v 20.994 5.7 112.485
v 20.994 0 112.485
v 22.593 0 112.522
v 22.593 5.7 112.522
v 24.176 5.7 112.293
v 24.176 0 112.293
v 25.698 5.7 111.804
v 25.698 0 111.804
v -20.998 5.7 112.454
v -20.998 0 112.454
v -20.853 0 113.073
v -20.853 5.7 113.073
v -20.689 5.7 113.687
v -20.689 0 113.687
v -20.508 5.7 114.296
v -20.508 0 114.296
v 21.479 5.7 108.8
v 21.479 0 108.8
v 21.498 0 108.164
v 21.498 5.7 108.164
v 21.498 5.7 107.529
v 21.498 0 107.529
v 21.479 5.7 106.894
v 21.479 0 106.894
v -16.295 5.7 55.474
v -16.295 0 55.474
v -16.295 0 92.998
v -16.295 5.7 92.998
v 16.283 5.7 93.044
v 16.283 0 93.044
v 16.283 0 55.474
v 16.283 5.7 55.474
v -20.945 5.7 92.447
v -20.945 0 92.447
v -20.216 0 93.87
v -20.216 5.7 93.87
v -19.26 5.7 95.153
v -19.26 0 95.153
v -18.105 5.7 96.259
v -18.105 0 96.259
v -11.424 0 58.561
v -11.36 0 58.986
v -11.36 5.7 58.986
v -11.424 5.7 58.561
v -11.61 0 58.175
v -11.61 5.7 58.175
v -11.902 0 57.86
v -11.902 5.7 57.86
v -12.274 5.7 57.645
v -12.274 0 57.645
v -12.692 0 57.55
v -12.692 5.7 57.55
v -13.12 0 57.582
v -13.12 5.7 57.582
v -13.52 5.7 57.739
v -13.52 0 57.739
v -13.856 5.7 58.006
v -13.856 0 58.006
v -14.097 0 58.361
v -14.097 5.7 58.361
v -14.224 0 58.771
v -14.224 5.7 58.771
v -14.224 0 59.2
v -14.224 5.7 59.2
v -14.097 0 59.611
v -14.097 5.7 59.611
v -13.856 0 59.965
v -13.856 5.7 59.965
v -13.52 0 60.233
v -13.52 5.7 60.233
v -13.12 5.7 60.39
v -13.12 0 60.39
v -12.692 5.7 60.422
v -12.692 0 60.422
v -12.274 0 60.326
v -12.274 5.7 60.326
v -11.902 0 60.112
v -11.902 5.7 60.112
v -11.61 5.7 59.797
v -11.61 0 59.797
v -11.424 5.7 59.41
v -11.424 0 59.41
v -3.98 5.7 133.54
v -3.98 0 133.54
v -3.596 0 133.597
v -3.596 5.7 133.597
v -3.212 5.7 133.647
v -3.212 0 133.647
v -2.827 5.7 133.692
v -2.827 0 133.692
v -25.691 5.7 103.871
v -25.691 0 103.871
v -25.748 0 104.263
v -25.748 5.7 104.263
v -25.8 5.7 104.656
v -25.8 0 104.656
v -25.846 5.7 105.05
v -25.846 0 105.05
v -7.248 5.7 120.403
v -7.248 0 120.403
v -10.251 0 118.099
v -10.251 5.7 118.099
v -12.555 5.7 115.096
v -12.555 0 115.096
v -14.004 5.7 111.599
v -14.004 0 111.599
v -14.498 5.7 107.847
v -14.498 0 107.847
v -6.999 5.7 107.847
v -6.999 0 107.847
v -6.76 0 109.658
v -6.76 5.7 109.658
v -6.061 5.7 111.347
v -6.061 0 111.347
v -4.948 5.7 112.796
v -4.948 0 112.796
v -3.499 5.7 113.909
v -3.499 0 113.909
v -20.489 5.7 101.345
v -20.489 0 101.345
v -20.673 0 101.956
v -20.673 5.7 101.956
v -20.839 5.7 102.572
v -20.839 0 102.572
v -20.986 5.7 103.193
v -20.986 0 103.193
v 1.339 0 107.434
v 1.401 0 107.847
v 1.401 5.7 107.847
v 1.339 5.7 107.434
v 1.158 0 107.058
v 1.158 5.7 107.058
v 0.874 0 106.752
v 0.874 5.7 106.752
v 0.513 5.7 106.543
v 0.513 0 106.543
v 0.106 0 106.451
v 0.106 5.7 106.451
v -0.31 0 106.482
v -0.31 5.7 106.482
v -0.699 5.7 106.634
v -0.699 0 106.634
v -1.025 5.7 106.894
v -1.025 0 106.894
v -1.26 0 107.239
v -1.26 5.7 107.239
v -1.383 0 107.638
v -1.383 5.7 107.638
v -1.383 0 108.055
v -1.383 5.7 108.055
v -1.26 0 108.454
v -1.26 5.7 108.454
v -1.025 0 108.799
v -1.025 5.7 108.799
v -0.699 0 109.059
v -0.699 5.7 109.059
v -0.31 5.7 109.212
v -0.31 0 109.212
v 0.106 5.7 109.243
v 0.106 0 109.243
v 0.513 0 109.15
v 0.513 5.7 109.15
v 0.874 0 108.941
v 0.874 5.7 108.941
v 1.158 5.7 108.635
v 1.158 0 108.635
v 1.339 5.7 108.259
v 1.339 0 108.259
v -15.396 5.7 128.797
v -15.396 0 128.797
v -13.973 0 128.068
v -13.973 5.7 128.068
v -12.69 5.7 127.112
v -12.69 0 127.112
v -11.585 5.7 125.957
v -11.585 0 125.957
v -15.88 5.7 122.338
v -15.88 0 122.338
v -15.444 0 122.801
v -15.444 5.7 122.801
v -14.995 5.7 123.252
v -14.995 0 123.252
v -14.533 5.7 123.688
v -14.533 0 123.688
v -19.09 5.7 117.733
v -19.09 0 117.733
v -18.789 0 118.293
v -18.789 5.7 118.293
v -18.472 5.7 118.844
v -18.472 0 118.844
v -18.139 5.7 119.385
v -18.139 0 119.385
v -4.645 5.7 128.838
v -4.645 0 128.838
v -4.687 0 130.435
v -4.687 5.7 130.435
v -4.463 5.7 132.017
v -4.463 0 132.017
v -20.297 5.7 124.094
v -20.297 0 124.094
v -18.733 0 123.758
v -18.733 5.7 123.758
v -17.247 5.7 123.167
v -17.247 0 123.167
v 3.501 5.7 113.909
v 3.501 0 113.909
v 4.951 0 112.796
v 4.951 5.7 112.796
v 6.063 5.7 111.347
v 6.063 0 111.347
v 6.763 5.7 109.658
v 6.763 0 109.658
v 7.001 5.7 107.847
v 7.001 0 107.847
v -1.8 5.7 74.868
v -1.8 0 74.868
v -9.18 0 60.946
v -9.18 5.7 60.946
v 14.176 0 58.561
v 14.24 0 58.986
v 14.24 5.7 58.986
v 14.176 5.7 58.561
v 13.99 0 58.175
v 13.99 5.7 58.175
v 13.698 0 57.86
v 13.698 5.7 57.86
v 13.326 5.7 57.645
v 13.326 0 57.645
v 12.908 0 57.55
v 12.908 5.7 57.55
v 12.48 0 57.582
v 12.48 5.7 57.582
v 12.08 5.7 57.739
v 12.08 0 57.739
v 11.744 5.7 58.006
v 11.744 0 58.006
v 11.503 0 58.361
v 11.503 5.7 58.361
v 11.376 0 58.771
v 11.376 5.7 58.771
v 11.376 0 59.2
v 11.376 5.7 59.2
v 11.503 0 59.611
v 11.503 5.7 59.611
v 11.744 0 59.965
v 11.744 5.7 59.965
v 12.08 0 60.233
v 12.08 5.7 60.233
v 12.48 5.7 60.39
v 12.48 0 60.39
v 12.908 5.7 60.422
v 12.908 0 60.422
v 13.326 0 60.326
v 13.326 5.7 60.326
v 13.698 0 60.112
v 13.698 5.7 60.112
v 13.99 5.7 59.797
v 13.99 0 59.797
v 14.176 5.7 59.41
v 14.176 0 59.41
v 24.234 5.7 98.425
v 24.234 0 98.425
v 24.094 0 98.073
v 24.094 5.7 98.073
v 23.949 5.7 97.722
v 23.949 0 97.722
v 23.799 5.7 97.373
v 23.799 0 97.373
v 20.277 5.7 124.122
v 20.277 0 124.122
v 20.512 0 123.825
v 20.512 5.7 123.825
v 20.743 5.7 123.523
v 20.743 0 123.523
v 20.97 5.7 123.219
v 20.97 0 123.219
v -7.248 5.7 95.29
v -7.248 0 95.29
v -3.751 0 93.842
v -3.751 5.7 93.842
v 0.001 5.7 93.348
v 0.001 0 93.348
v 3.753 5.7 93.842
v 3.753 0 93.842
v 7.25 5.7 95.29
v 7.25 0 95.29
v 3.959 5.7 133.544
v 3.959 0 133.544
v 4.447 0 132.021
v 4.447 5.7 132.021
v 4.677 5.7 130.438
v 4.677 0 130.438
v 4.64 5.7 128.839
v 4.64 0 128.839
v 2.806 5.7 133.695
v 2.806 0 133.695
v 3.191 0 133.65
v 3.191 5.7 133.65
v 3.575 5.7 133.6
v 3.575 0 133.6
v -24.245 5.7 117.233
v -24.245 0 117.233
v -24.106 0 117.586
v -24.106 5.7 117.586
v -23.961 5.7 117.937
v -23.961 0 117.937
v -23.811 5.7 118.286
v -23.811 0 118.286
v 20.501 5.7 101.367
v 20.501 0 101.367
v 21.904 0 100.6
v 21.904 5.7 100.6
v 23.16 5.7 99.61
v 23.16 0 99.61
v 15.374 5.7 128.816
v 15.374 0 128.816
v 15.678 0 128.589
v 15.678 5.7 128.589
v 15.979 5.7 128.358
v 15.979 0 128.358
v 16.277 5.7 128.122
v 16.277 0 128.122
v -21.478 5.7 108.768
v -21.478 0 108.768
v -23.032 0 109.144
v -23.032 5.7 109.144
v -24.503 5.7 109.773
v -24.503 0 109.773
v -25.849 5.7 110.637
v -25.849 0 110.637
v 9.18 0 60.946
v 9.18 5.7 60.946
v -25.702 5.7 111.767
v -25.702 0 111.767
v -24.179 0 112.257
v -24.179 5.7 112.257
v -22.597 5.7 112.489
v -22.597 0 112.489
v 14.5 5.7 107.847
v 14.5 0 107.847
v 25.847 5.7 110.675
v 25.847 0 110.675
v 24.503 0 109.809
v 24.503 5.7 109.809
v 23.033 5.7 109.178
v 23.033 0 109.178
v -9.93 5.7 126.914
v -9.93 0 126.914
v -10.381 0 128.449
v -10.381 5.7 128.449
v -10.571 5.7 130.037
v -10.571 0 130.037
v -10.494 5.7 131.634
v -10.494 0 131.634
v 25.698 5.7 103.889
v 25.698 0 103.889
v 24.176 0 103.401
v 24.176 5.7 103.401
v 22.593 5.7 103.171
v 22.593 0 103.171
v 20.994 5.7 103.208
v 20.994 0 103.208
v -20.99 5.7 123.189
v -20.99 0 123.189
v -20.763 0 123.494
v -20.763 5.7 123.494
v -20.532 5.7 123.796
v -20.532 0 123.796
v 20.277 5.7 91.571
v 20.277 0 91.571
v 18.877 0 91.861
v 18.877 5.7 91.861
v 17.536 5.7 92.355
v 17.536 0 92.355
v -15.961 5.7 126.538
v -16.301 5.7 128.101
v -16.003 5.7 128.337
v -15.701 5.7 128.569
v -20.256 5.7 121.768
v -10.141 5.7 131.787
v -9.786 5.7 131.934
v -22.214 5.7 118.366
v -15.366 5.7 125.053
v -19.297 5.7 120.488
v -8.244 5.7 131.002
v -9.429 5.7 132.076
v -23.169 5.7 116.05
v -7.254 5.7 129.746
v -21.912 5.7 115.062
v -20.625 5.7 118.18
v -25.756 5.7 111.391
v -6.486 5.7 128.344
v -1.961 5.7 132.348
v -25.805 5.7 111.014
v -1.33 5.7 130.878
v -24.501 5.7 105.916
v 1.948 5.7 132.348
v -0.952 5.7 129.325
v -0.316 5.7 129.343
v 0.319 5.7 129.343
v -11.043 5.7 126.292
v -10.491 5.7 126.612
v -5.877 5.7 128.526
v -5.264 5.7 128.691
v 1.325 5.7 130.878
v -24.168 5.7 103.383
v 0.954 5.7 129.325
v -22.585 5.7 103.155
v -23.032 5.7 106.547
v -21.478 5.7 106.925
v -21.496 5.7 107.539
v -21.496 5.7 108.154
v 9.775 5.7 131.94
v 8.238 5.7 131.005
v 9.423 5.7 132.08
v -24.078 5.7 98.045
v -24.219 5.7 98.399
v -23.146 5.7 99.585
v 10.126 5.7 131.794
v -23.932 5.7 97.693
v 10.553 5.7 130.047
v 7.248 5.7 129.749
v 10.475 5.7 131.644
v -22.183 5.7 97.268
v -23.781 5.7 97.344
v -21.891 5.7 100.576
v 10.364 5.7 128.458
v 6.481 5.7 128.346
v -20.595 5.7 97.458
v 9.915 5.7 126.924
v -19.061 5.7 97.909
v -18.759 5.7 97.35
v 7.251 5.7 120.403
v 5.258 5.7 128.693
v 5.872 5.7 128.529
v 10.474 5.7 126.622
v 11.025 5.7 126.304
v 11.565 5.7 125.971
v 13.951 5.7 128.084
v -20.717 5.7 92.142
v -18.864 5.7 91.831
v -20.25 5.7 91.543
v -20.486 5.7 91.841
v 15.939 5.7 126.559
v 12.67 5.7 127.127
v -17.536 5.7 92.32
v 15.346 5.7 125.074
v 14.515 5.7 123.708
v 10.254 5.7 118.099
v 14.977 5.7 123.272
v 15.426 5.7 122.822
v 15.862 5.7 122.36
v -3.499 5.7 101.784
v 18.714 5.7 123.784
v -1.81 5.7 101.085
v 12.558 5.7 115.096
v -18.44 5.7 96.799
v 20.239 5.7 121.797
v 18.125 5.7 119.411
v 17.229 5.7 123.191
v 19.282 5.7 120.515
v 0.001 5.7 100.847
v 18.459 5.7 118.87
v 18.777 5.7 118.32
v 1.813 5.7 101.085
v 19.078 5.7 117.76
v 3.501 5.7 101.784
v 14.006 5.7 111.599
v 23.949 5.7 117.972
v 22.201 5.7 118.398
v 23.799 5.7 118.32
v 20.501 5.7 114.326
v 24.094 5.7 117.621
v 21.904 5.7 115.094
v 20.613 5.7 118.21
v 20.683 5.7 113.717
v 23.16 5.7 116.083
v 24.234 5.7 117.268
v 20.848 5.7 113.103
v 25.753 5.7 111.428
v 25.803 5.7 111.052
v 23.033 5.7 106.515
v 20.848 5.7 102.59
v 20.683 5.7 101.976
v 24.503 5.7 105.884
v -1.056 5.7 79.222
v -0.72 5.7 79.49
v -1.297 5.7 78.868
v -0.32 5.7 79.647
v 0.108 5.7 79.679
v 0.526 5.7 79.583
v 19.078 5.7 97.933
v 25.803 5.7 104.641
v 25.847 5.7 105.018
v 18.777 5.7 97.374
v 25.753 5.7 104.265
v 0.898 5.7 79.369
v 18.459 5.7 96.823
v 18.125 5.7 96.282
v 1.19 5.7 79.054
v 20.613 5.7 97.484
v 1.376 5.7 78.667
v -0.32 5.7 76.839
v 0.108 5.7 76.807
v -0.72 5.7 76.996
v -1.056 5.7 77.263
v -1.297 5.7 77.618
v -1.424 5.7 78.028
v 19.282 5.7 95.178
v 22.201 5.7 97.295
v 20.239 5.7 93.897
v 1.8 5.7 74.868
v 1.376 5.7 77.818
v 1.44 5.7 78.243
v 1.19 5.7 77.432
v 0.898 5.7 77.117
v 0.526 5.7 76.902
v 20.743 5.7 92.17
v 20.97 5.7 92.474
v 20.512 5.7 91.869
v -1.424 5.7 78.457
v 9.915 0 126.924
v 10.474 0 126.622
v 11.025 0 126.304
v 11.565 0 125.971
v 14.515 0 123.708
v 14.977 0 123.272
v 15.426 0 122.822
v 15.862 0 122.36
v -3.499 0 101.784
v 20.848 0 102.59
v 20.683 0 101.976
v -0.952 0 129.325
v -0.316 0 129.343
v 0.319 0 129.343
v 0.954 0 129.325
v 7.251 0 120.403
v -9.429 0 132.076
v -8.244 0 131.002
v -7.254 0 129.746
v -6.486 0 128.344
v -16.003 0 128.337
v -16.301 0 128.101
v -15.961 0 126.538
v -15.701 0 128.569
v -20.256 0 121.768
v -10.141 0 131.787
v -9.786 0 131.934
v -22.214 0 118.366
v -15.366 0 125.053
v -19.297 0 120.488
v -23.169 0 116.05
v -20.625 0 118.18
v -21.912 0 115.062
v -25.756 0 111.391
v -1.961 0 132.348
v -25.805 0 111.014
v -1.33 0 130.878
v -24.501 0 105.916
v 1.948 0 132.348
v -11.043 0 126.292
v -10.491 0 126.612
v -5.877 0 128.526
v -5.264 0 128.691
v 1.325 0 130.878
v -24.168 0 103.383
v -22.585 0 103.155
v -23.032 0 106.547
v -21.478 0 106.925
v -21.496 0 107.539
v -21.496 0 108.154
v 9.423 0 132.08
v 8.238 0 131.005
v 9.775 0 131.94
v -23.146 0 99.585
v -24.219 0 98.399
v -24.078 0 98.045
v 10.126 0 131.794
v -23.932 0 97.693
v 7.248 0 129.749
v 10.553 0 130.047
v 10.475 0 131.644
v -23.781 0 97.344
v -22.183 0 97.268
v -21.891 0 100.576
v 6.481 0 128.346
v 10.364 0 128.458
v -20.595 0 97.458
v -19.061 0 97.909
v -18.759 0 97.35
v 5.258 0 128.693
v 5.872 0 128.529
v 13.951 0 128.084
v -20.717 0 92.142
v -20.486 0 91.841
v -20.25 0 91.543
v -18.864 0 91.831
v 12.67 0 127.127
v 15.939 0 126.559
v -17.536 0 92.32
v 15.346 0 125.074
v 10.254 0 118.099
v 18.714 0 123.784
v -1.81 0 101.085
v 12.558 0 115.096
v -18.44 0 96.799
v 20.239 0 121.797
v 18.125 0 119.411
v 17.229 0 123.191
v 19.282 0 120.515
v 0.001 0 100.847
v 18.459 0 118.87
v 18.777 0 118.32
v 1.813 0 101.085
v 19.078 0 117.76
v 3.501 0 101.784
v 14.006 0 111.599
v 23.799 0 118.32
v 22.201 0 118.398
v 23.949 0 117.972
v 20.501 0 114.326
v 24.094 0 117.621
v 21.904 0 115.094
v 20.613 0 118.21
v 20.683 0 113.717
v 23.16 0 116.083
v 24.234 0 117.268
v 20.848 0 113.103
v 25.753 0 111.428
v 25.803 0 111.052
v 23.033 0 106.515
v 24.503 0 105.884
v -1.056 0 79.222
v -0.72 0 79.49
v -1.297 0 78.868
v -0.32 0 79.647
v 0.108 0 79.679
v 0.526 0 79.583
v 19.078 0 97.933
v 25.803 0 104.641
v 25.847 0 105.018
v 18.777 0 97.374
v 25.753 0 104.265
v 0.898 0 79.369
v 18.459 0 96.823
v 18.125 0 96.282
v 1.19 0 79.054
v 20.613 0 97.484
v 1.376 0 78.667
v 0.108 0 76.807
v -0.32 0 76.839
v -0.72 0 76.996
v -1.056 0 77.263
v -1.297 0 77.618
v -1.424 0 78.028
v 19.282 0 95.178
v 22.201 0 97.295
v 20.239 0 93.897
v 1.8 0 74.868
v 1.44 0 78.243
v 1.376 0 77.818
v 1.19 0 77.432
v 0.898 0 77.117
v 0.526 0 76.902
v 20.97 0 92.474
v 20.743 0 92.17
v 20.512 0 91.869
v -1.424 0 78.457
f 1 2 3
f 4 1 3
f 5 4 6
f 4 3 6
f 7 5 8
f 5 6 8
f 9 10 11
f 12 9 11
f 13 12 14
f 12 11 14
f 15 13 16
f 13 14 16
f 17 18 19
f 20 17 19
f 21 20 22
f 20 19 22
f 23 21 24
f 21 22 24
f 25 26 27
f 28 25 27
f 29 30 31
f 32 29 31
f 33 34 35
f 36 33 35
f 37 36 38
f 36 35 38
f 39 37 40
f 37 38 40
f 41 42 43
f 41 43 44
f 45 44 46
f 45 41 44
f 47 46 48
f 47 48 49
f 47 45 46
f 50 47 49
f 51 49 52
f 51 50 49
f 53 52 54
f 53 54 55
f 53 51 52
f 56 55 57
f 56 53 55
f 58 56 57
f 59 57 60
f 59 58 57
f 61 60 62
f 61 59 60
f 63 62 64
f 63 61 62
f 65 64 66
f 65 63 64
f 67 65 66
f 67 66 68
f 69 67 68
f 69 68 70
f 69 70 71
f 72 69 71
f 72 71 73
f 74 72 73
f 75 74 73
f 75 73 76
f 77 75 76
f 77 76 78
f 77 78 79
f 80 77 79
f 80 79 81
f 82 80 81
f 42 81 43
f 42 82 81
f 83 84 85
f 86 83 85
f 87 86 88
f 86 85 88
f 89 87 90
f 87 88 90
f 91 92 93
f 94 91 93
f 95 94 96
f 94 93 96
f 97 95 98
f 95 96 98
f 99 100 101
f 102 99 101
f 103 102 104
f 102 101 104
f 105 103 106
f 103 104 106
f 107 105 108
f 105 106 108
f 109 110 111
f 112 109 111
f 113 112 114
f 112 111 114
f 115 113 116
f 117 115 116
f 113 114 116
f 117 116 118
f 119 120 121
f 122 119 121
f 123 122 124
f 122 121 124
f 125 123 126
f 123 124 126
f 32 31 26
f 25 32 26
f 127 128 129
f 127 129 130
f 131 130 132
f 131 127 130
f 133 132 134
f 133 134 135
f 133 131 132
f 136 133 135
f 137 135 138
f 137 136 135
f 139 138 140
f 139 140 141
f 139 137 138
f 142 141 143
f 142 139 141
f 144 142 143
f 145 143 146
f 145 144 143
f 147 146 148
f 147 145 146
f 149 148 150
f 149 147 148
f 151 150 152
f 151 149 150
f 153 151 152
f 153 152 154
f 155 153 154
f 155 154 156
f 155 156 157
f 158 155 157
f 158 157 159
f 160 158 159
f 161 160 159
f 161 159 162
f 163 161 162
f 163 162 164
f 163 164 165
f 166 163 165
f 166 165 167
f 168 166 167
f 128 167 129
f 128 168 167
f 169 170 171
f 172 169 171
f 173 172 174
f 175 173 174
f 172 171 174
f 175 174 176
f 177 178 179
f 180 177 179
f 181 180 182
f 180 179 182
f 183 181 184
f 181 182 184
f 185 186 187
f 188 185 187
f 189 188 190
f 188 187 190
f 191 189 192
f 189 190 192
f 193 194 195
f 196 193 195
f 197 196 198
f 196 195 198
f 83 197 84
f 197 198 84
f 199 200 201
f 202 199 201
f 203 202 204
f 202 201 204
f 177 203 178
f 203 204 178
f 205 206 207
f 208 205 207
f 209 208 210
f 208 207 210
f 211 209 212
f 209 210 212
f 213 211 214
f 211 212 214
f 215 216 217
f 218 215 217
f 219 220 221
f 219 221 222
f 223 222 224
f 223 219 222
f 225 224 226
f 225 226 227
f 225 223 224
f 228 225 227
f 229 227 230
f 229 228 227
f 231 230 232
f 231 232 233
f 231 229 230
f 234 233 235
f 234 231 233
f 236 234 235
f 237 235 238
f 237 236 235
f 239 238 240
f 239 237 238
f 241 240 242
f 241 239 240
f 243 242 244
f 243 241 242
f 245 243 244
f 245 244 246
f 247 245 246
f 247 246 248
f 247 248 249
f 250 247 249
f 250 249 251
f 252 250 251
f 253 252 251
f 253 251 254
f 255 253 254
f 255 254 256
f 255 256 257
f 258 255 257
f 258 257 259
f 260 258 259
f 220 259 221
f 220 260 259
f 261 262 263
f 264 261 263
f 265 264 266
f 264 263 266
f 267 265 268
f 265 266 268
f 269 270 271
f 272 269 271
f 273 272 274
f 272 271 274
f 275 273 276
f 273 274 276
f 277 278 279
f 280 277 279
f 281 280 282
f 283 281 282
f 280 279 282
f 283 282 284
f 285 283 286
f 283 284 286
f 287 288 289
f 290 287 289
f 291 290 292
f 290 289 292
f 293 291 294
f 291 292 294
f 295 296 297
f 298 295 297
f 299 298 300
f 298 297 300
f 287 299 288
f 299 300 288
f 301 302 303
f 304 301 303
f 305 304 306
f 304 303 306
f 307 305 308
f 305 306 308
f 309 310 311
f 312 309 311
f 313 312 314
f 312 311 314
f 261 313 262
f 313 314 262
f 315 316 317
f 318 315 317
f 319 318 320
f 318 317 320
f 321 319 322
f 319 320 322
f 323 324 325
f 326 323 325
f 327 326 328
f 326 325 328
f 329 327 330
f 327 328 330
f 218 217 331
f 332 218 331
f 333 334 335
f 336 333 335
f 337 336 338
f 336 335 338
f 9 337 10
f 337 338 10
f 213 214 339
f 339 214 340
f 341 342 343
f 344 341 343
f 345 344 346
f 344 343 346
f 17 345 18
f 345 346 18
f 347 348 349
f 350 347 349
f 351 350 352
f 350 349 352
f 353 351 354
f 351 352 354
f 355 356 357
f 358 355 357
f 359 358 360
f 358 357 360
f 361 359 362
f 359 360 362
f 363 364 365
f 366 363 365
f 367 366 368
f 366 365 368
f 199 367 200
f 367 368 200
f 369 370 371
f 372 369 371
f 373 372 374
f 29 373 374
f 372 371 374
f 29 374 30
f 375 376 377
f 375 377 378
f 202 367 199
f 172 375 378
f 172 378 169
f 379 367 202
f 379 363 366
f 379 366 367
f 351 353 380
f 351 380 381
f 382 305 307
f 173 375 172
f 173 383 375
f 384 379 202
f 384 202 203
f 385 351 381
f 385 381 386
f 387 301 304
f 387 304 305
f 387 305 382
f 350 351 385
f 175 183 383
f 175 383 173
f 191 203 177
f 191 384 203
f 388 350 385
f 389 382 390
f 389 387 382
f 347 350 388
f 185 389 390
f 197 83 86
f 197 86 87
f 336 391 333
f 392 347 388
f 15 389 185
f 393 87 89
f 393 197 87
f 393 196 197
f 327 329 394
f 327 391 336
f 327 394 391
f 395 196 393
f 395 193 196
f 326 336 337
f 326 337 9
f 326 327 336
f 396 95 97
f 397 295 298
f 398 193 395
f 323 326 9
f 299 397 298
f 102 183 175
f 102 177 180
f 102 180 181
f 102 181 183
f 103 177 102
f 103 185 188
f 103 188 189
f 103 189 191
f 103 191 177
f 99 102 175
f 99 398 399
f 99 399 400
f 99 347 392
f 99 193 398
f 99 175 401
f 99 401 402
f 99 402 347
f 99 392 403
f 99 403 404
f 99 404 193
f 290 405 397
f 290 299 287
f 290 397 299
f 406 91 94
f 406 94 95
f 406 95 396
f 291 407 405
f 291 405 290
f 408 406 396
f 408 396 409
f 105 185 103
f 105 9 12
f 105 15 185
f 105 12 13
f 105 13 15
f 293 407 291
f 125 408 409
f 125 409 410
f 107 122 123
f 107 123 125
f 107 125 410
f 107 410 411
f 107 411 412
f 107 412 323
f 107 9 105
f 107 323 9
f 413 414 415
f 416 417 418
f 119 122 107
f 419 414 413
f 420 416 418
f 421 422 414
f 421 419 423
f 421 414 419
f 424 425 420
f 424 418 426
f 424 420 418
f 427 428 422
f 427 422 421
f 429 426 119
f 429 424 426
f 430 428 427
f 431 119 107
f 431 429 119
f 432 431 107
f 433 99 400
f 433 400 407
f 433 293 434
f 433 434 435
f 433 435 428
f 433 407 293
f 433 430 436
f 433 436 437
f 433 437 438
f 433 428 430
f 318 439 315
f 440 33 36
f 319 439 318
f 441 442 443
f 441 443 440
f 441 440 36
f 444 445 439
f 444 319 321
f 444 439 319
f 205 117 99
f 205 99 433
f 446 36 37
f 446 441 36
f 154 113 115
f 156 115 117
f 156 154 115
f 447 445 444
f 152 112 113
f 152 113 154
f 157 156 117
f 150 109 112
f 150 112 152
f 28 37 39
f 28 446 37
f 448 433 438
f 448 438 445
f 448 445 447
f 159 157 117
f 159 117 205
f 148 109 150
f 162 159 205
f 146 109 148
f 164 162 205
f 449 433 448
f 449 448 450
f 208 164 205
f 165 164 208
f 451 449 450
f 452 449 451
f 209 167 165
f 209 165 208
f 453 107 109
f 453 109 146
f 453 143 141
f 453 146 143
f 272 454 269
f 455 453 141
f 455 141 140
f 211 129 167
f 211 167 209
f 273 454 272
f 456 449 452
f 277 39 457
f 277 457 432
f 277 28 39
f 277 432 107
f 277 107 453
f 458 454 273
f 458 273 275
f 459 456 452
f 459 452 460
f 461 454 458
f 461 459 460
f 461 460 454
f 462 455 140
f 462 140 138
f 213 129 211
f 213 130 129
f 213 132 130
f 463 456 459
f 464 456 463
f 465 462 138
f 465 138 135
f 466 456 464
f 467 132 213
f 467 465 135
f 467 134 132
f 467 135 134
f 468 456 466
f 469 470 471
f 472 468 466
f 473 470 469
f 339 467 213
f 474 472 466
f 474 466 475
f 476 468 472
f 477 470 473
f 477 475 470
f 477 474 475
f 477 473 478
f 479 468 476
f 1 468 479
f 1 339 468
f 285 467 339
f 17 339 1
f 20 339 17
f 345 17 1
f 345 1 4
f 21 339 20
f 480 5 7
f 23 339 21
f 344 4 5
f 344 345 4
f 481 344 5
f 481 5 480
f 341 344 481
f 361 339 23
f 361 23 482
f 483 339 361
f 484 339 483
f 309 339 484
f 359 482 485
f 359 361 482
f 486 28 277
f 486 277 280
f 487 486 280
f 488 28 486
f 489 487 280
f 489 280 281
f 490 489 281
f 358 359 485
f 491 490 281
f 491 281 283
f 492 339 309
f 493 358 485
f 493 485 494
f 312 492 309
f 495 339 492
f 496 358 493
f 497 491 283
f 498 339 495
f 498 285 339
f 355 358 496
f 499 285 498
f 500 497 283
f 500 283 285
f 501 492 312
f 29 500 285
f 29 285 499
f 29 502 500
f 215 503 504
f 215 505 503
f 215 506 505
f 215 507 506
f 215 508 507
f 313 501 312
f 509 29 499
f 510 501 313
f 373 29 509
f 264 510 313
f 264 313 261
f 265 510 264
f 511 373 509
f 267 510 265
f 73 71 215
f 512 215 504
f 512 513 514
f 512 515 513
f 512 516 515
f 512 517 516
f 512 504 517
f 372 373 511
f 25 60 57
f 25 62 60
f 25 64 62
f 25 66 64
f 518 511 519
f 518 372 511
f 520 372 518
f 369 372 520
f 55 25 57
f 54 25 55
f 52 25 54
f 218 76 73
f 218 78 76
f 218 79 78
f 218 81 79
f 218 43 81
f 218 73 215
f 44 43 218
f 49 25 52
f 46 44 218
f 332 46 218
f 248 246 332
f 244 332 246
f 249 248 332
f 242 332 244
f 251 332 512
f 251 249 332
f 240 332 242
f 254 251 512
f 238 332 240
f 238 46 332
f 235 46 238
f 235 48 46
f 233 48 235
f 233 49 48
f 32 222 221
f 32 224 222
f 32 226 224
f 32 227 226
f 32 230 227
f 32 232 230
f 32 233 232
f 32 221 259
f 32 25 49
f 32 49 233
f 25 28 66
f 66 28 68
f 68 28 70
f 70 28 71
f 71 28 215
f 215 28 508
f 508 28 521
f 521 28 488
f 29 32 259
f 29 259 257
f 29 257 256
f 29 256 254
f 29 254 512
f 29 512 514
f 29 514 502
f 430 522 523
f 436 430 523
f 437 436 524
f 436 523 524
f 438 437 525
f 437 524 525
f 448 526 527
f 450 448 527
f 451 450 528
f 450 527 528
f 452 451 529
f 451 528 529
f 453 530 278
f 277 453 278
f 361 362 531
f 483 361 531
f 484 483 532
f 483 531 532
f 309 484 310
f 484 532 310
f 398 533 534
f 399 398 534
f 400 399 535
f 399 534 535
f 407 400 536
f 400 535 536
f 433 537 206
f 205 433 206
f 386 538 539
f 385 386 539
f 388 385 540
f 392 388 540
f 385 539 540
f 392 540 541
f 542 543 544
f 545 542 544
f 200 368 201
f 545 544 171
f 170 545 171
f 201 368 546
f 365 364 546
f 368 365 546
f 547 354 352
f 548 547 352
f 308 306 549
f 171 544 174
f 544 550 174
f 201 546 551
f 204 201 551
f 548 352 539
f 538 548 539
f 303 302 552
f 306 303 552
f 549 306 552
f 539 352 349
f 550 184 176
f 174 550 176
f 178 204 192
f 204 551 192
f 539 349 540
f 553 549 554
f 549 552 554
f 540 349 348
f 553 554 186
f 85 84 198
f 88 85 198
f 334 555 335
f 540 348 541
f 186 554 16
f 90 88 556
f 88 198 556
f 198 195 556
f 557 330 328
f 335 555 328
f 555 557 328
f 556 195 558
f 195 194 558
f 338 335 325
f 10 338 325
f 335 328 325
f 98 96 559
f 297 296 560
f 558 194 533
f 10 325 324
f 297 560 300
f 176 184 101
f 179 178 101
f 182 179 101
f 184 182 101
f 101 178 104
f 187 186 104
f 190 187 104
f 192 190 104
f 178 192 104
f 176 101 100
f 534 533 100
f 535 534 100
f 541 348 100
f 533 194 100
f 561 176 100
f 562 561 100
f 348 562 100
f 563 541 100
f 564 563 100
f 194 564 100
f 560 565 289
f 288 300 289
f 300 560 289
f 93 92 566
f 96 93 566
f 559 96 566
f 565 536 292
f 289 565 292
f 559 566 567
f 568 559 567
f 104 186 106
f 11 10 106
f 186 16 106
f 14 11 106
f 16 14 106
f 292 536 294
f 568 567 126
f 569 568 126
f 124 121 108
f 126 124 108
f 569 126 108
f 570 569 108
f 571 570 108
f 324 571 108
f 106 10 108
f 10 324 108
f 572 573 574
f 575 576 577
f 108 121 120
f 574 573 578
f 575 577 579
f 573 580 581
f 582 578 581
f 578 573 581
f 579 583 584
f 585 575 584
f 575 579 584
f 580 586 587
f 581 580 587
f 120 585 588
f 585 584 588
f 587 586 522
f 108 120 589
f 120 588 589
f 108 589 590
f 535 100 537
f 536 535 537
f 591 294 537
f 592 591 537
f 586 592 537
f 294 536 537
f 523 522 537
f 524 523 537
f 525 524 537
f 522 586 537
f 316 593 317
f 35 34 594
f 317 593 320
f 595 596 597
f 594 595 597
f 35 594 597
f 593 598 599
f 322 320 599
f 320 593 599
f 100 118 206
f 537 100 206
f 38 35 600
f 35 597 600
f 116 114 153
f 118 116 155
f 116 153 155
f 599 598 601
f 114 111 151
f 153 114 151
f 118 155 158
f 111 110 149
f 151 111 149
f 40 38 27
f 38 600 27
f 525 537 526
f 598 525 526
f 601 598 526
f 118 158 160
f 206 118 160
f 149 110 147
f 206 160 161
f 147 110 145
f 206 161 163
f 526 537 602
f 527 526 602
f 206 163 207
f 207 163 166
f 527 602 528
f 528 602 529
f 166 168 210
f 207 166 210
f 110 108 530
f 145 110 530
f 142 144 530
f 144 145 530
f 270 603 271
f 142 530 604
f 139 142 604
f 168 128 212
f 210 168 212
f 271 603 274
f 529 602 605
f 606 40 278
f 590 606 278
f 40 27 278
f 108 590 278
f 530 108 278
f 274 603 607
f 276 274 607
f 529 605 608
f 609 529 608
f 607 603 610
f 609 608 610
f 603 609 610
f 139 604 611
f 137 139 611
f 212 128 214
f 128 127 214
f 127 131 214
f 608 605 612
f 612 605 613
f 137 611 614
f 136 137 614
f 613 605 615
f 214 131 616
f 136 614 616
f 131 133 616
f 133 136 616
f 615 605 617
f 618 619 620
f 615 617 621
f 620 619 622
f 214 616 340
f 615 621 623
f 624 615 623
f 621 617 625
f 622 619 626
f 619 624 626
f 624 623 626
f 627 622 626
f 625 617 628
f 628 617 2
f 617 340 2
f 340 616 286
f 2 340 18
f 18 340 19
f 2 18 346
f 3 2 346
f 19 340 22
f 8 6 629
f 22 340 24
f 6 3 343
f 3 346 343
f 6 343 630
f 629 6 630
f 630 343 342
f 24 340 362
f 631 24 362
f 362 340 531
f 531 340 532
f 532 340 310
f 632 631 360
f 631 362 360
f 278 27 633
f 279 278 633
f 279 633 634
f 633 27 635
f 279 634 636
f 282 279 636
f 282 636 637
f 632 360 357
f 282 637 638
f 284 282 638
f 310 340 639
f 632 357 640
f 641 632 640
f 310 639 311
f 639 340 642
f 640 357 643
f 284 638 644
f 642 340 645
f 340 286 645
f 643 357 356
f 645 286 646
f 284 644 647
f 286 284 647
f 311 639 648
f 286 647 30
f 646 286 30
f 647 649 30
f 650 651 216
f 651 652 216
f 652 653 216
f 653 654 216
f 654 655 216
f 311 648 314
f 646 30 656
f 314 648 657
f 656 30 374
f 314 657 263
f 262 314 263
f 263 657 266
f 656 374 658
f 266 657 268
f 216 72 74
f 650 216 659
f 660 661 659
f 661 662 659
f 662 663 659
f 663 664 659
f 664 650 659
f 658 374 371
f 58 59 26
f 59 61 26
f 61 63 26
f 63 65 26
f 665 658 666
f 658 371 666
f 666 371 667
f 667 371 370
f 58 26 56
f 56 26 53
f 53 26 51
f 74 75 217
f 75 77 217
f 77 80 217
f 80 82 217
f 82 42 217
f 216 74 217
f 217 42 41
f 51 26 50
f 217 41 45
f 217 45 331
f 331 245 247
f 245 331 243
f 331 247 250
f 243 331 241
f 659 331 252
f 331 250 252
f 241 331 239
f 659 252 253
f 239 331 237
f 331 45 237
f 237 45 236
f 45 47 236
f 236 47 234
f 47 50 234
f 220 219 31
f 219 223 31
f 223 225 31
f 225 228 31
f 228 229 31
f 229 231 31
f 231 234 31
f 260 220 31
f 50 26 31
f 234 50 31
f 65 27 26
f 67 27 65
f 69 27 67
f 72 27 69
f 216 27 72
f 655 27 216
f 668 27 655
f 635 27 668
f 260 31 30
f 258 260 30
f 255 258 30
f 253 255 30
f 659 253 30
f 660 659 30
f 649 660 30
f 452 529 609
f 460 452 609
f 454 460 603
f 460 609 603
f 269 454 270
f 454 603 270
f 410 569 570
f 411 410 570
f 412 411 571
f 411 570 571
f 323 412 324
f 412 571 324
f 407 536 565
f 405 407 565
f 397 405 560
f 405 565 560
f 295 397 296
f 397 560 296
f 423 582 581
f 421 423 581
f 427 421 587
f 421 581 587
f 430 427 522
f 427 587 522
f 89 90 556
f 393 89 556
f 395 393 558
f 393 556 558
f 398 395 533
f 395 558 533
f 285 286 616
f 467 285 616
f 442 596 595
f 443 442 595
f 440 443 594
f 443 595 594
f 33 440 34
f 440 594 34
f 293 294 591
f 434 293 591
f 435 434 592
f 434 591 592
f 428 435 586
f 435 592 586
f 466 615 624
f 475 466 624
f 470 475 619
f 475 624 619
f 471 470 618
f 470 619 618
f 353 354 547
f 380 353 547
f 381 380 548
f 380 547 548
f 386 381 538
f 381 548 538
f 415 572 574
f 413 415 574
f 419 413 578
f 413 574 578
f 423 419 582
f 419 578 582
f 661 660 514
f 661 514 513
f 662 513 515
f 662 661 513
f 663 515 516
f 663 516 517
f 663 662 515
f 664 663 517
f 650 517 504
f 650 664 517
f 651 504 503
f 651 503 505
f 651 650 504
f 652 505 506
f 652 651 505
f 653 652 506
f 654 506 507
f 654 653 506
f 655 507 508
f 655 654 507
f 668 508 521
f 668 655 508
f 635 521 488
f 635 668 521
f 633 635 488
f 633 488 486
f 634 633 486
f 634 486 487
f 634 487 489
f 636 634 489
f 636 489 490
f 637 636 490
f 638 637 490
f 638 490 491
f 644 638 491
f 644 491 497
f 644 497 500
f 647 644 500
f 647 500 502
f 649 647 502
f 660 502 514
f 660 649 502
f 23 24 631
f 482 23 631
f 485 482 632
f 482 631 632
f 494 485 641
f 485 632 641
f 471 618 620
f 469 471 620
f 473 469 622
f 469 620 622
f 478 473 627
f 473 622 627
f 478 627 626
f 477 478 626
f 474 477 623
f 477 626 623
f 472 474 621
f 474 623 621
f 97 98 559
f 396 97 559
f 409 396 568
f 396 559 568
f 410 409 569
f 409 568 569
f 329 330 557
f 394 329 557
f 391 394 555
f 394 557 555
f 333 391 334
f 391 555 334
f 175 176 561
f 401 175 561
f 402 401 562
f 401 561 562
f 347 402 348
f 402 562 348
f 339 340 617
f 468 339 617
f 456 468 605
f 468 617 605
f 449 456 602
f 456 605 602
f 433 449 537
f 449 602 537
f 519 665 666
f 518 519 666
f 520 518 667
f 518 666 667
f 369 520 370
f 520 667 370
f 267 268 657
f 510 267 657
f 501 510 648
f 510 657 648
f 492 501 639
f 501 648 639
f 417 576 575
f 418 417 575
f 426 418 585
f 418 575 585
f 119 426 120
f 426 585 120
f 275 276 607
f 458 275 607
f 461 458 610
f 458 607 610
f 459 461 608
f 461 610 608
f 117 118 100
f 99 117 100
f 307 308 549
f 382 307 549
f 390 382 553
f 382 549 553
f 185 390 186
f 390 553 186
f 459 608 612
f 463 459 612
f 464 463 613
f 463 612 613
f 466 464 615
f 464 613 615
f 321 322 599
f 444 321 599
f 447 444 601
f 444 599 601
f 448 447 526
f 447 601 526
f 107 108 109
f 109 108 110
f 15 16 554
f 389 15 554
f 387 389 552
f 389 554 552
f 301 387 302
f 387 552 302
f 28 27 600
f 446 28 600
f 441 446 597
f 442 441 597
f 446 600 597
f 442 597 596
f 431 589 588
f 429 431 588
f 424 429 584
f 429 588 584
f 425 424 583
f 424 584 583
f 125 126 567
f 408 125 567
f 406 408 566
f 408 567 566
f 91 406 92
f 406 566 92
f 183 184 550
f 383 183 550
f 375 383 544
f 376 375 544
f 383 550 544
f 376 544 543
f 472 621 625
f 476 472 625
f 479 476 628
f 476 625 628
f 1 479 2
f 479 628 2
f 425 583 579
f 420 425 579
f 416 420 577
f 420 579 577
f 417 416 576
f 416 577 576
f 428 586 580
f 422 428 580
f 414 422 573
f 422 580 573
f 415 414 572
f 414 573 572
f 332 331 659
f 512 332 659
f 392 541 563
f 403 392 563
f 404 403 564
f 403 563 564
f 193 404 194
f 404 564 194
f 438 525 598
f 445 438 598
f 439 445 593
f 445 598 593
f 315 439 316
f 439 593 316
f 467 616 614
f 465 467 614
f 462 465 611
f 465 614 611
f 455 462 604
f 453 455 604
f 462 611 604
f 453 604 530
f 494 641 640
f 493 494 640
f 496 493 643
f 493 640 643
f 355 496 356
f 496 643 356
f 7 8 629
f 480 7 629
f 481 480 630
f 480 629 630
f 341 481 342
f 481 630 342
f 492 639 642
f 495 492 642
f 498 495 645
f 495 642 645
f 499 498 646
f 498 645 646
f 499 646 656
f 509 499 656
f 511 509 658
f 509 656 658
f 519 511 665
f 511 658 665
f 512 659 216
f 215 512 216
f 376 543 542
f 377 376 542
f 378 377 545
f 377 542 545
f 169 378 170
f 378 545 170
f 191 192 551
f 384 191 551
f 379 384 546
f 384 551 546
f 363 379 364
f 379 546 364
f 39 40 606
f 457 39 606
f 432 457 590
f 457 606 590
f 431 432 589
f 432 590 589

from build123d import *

# Parameters (mm, degrees)
SKETCH1_R           = 1.4
SKETCH1_R_2         = 1.44
BOSS_EXTRUDE2_DEPTH = 5.7


with BuildPart() as part:
    # Sketch1 → Boss-Extrude2 (new body)
    with BuildSketch(Plane(origin=(0, 0, 0), x_dir=(1, 0, 0), z_dir=(0, 1, 0))):
        with BuildLine():
            Line((16.282643734, -55.473929669), (-16.294749294, -55.473929669))
            Line((-16.294749294, -55.473929669), (-16.294749294, -92.997636196))
            ThreePointArc((-16.294749294, -92.997636196), (-18.191440049, -92.050885637), (-20.249670305, -91.543479832))
            ThreePointArc((-20.249670305, -91.543479832), (-20.602163218, -91.991288827), (-20.944755668, -92.446716717))
            ThreePointArc((-20.944755668, -92.446716717), (-19.764567011, -94.531247615), (-18.105041425, -96.258699254))
            ThreePointArc((-18.105041425, -96.258699254), (-18.601337045, -97.073436545), (-19.060996376, -97.909390787))
            ThreePointArc((-19.060996376, -97.909390787), (-21.385246964, -97.329758545), (-23.780643137, -97.343597276))
            ThreePointArc((-23.780643137, -97.343597276), (-24.005836083, -97.869056559), (-24.219420722, -98.399340372))
            ThreePointArc((-24.219420722, -98.399340372), (-22.53946113, -100.106926418), (-20.489045224, -101.345437195))
            ThreePointArc((-20.489045224, -101.345437195), (-20.758075202, -102.263784688), (-20.985968299, -103.193195246))
            ThreePointArc((-20.985968299, -103.193195246), (-23.3810186, -103.236188129), (-25.690864, -103.870797115))
            ThreePointArc((-25.690864, -103.870797115), (-25.775064405, -104.459357336), (-25.845783772, -105.049689119))
            ThreePointArc((-25.845783772, -105.049689119), (-23.779779823, -106.262018289), (-21.477950818, -106.92511524))
            ThreePointArc((-21.477950818, -106.92511524), (-21.497710797, -107.846662377), (-21.477950818, -108.768209514))
            ThreePointArc((-21.477950818, -108.768209514), (-23.780746321, -109.427942192), (-25.848519588, -110.637251105))
            ThreePointArc((-25.848519588, -110.637251105), (-25.781205181, -111.202699229), (-25.701523459, -111.766537533))
            ThreePointArc((-25.701523459, -111.766537533), (-23.393073925, -112.406205481), (-20.998123562, -112.454445414))
            ThreePointArc((-20.998123562, -112.454445414), (-20.773235617, -113.38074943), (-20.507508787, -114.296174451))
            ThreePointArc((-20.507508787, -114.296174451), (-22.561079267, -115.529447584), (-24.245391936, -117.232740033))
            ThreePointArc((-24.245391936, -117.232740033), (-24.033987825, -117.761573279), (-23.811051179, -118.285649183))
            ThreePointArc((-23.811051179, -118.285649183), (-21.415701651, -118.306020019), (-19.089879068, -117.732728078))
            ThreePointArc((-19.089879068, -117.732728078), (-18.6328306, -118.56937566), (-18.139140457, -119.384938363))
            ThreePointArc((-18.139140457, -119.384938363), (-19.803499131, -121.107733922), (-20.989523145, -123.188950243))
            ThreePointArc((-20.989523145, -123.188950243), (-20.6482393, -123.645300692), (-20.297036031, -124.094061943))
            ThreePointArc((-20.297036031, -124.094061943), (-17.978064026, -123.493659436), (-15.879929184, -122.337828774))
            ThreePointArc((-15.879929184, -122.337828774), (-15.221495643, -123.028026694), (-14.533094291, -123.688338344))
            ThreePointArc((-14.533094291, -123.688338344), (-15.694637363, -125.783316155), (-16.301356047, -128.100643661))
            ThreePointArc((-16.301356047, -128.100643661), (-15.852512396, -128.453869244), (-15.396017905, -128.797150052))
            ThreePointArc((-15.396017905, -128.797150052), (-13.311697063, -127.616590454), (-11.584540779, -125.95675748))
            ThreePointArc((-11.584540779, -125.95675748), (-10.767926313, -126.453945848), (-9.930014765, -126.914336658))
            ThreePointArc((-9.930014765, -126.914336658), (-10.50881973, -129.2387934), (-10.494128437, -131.634184496))
            ThreePointArc((-10.494128437, -131.634184496), (-9.96421413, -131.861006909), (-9.429401724, -132.076026145))
            ThreePointArc((-9.429401724, -132.076026145), (-7.723011964, -130.394851461), (-6.485961057, -128.34355446))
            ThreePointArc((-6.485961057, -128.34355446), (-5.571070397, -128.610954069), (-4.645226545, -128.837538785))
            ThreePointArc((-4.645226545, -128.837538785), (-4.607931078, -131.230595815), (-3.979841993, -133.540058306))
            ThreePointArc((-3.979841993, -133.540058306), (-3.404307437, -133.622657246), (-2.827069767, -133.692365802))
            ThreePointArc((-2.827069767, -133.692365802), (-1.614740596, -131.626361853), (-0.951643646, -129.324532848))
            ThreePointArc((-0.951643646, -129.324532848), (0.001289203, -129.345662377), (0.954222052, -129.324532848))
            ThreePointArc((0.954222052, -129.324532848), (1.605623598, -131.625984951), (2.805751963, -133.694969645))
            ThreePointArc((2.805751963, -133.694969645), (3.383053833, -133.62579479), (3.958664509, -133.543727981))
            ThreePointArc((3.958664509, -133.543727981), (4.594963395, -131.234347532), (4.63970868, -128.839329329))
            ThreePointArc((4.63970868, -128.839329329), (5.565639854, -128.613101716), (6.480633579, -128.346054989))
            ThreePointArc((6.480633579, -128.346054989), (7.716893233, -130.397828953), (9.422634458, -132.079661646))
            ThreePointArc((9.422634458, -132.079661646), (9.951058445, -131.867530222), (10.474710197, -131.643877606))
            ThreePointArc((10.474710197, -131.643877606), (10.491616082, -129.248501117), (9.914960384, -126.923510248))
            ThreePointArc((9.914960384, -126.923510248), (10.750789203, -126.465342533), (11.565488494, -125.9705774))
            ThreePointArc((11.565488494, -125.9705774), (13.290661801, -127.632471318), (15.373571634, -128.815518637))
            ThreePointArc((15.373571634, -128.815518637), (15.829086357, -128.473849224), (16.277009552, -128.12228634))
            ThreePointArc((16.277009552, -128.12228634), (15.673370328, -125.804154761), (14.514611779, -123.707635512))
            ThreePointArc((14.514611779, -123.707635512), (15.203377892, -123.048751065), (15.862262338, -122.359984953))
            ThreePointArc((15.862262338, -122.359984953), (17.958781587, -123.518743501), (20.276913167, -124.122382726))
            ThreePointArc((20.276913167, -124.122382726), (20.628476051, -123.674459531), (20.970145463, -123.218944808))
            ThreePointArc((20.970145463, -123.218944808), (19.787098144, -121.136034974), (18.125204226, -119.410861668))
            ThreePointArc((18.125204226, -119.410861668), (18.619969359, -118.596162377), (19.078137075, -117.760333557))
            ThreePointArc((19.078137075, -117.760333557), (21.403127944, -118.336989255), (23.798504433, -118.32008337))
            ThreePointArc((23.798504433, -118.32008337), (24.022157048, -117.796431618), (24.234288472, -117.268007632))
            ThreePointArc((24.234288472, -117.268007632), (22.552455779, -115.562266407), (20.500681815, -114.326006752))
            ThreePointArc((20.500681815, -114.326006752), (20.767728542, -113.411013027), (20.993956155, -112.485081853))
            ThreePointArc((20.993956155, -112.485081853), (23.388974358, -112.440336569), (25.698354808, -111.804037682))
            ThreePointArc((25.698354808, -111.804037682), (25.778855599, -111.240343374), (25.846992628, -110.675021347))
            ThreePointArc((25.846992628, -110.675021347), (23.780988679, -109.462692176), (21.479159674, -108.799595225))
            ThreePointArc((21.479159674, -108.799595225), (21.500289203, -107.846662377), (21.479159674, -106.893729528))
            ThreePointArc((21.479159674, -106.893729528), (23.780988679, -106.230632577), (25.846992628, -105.018303407))
            ThreePointArc((25.846992628, -105.018303407), (25.778855599, -104.452981379), (25.698354808, -103.889287071))
            ThreePointArc((25.698354808, -103.889287071), (23.388974358, -103.252988184), (20.993956155, -103.2082429))
            ThreePointArc((20.993956155, -103.2082429), (20.767728542, -102.282311726), (20.500681815, -101.367318001))
            ThreePointArc((20.500681815, -101.367318001), (22.552455779, -100.131058346), (24.234288472, -98.425317121))
            ThreePointArc((24.234288472, -98.425317121), (24.022157048, -97.896893135), (23.798504433, -97.373241383))
            ThreePointArc((23.798504433, -97.373241383), (21.403127944, -97.356335498), (19.078137075, -97.932991196))
            ThreePointArc((19.078137075, -97.932991196), (18.619969359, -97.097162377), (18.125204226, -96.282463086))
            ThreePointArc((18.125204226, -96.282463086), (19.787098144, -94.557289779), (20.970145463, -92.474379945))
            ThreePointArc((20.970145463, -92.474379945), (20.628476051, -92.018865222), (20.276913167, -91.570942027))
            ThreePointArc((20.276913167, -91.570942027), (18.197116907, -92.083089067), (16.282643734, -93.043630342))
            Line((16.282643734, -93.043630342), (16.282643734, -55.473929669))
        make_face()
        with BuildLine():
            ThreePointArc((-6.998710797, -107.846662377), (-6.060888623, -111.346662377), (-3.498710797, -113.908840203))
            Line((-3.498710797, -113.908840203), (-7.248210797, -120.403164706))
            ThreePointArc((-7.248210797, -120.403164706), (-12.555213127, -115.096162377), (-14.497710797, -107.846662377))
            Line((-14.497710797, -107.846662377), (-6.998710797, -107.846662377))
        make_face(mode=Mode.SUBTRACT)
        with Locations((0.001289203, -107.846662377)):
            Circle(SKETCH1_R, mode=Mode.SUBTRACT)
        with BuildLine():
            Line((7.250789203, -120.403164706), (3.501289203, -113.908840203))
            ThreePointArc((3.501289203, -113.908840203), (6.06346703, -111.346662377), (7.001289203, -107.846662377))
            Line((7.001289203, -107.846662377), (14.500289203, -107.846662377))
            ThreePointArc((14.500289203, -107.846662377), (12.557791533, -115.096162377), (7.250789203, -120.403164706))
        make_face(mode=Mode.SUBTRACT)
        with BuildLine():
            Line((7.250246793, -95.289846902), (3.501289203, -101.78448455))
            ThreePointArc((3.501289203, -101.78448455), (0.001289203, -100.846662377), (-3.498710797, -101.78448455))
            Line((-3.498710797, -101.78448455), (-7.248210797, -95.290160047))
            ThreePointArc((-7.248210797, -95.290160047), (0.000976046, -93.34766238), (7.250246793, -95.289846902))
        make_face(mode=Mode.SUBTRACT)
        with Locations((-12.8, -58.985750662)):
            Circle(SKETCH1_R_2, mode=Mode.SUBTRACT)
        with Locations((0, -78.242875331)):
            Circle(SKETCH1_R_2, mode=Mode.SUBTRACT)
        Polygon((-1.8, -74.867693206), (-9.18, -60.945750662), (9.18, -60.945750662), (1.8, -74.867693206), align=None, mode=Mode.SUBTRACT)
        with Locations((12.8, -58.985750662)):
            Circle(SKETCH1_R_2, mode=Mode.SUBTRACT)
    extrude(amount=BOSS_EXTRUDE2_DEPTH)


solid = part.part
